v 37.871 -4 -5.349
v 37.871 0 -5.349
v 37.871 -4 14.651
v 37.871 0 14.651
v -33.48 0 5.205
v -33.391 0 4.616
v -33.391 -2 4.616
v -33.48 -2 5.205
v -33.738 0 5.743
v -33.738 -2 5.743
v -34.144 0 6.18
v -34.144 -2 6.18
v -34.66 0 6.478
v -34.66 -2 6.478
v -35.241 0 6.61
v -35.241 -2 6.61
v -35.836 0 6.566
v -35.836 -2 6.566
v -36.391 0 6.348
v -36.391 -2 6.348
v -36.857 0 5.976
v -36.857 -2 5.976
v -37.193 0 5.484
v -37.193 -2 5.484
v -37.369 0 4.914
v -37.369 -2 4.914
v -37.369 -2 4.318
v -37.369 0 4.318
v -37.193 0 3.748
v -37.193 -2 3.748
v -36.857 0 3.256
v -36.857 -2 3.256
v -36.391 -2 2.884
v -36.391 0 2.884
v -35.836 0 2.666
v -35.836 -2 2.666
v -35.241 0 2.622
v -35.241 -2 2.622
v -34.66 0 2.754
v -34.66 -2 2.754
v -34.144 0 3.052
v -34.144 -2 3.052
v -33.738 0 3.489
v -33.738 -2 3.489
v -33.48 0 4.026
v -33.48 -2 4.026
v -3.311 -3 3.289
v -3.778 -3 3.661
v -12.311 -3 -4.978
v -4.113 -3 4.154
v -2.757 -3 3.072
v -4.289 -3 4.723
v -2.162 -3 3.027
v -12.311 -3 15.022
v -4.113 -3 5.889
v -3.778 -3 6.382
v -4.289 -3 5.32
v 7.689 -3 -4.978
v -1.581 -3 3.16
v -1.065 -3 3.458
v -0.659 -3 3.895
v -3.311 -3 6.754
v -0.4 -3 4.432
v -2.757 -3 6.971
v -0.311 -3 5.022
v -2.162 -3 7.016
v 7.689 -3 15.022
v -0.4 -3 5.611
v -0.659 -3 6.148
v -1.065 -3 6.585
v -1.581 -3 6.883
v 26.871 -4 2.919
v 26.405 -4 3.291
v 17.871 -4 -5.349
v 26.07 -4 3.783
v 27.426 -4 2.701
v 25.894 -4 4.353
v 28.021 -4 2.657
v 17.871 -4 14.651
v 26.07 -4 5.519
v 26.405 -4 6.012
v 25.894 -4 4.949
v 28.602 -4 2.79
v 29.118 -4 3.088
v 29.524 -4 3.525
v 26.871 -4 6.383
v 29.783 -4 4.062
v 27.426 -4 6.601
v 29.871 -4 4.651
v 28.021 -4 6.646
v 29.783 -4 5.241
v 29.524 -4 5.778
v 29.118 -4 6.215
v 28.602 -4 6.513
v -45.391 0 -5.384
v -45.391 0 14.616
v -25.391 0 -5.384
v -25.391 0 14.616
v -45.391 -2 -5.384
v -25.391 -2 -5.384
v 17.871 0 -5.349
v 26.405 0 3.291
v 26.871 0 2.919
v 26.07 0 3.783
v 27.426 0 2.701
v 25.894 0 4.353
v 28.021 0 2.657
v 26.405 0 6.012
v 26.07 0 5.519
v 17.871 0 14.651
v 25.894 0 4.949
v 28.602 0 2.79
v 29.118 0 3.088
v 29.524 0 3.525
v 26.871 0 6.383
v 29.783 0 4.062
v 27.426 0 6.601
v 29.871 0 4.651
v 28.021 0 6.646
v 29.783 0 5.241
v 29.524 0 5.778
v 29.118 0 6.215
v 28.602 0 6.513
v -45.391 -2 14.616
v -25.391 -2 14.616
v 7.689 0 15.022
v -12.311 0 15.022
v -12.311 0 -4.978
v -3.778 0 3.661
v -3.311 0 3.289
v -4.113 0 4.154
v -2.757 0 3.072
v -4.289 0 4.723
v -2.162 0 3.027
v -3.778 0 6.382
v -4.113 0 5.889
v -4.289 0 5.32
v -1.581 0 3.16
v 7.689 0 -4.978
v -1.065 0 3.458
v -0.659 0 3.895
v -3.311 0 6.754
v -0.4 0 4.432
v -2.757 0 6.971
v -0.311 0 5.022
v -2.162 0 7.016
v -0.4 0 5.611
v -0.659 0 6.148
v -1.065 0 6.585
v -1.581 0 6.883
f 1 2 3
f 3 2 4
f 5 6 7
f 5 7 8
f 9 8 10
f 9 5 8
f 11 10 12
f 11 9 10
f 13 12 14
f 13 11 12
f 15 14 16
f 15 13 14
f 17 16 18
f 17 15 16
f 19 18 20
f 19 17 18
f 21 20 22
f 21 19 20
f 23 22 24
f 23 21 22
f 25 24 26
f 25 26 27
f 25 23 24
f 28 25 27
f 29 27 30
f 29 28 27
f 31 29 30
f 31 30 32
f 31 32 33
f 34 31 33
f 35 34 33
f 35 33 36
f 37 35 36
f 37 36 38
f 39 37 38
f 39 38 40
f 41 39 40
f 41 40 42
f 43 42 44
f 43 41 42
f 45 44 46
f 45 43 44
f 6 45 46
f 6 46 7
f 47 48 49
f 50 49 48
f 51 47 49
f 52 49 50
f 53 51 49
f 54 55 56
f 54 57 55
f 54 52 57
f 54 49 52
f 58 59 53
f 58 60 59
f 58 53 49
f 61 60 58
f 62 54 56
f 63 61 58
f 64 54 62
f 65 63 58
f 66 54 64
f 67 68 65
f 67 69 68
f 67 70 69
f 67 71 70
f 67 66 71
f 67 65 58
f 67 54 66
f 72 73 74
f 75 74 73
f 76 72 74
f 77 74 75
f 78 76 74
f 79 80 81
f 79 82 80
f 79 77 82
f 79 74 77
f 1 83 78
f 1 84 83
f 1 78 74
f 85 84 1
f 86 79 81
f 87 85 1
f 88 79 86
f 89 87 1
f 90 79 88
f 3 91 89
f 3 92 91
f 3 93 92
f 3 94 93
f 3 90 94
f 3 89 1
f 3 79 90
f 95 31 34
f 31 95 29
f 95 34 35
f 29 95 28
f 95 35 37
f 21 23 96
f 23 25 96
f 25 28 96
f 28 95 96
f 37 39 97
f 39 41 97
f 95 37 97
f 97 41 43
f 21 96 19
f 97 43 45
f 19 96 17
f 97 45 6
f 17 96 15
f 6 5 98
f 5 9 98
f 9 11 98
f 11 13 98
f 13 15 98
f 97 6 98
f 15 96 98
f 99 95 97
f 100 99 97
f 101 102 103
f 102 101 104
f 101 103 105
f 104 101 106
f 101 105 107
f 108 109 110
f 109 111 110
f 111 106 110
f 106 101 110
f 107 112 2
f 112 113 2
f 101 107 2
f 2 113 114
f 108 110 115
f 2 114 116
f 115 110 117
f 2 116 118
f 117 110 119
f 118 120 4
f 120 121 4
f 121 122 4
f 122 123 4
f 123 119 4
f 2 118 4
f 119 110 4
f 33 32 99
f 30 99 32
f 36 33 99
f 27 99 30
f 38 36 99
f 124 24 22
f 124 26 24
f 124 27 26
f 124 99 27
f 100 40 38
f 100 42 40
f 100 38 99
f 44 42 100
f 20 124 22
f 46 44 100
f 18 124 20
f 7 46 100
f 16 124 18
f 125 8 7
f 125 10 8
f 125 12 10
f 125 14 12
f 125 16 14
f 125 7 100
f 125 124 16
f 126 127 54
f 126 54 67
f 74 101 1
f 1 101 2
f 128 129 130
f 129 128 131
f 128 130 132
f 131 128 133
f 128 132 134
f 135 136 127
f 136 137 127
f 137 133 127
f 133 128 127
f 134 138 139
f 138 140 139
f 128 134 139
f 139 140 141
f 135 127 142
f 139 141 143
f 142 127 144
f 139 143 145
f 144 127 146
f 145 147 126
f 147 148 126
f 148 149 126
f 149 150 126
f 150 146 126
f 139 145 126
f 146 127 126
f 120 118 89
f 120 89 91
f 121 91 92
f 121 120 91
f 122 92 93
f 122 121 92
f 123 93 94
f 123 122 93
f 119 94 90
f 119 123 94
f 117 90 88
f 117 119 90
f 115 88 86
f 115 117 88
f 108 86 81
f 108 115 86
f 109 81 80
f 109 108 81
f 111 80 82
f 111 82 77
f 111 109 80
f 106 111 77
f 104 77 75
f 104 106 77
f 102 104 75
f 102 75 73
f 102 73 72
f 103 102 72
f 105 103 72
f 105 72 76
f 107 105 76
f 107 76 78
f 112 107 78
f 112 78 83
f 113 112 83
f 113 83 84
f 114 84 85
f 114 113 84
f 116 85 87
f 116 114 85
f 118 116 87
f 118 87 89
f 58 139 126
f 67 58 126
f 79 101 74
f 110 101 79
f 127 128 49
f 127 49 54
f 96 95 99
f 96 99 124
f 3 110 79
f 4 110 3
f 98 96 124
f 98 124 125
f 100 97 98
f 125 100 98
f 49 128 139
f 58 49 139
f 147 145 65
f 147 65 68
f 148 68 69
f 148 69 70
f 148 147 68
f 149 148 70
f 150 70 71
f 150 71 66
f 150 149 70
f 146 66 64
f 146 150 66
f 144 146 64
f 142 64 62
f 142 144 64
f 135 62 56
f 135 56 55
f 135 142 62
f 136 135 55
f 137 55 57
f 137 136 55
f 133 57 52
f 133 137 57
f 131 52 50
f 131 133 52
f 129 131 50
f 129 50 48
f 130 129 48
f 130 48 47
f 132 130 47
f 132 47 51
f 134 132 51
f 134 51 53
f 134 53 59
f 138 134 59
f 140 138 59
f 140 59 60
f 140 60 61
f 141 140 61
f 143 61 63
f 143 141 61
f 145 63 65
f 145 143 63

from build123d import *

# Parameters (mm, degrees)
F0_W     = 20
F0_H     = 20
F0_R     = 2
F1_DEPTH = 2
F2_DEPTH = 3
F3_DEPTH = 4


with BuildPart() as f1:
    # F0 (on Front) → F1 (new body)
    with BuildSketch(Plane.XZ):
        with Locations((-35.390915, 4.615962)):
            Rectangle(F0_W, F0_H)
        with Locations((-35.390915, 4.615962)):
            Circle(F0_R, mode=Mode.SUBTRACT)
    extrude(amount=F1_DEPTH)


with BuildPart() as f2:
    # F0 (on Front) → F2 (new body)
    with BuildSketch(Plane.XZ):
        with Locations((-2.311487, 5.021508)):
            Rectangle(F0_W, F0_H)
        with Locations((-2.311487, 5.021508)):
            Circle(F0_R, mode=Mode.SUBTRACT)
    extrude(amount=F2_DEPTH)


with BuildPart() as f3:
    # F0 (on Front) → F3 (new body)
    with BuildSketch(Plane.XZ):
        with Locations((27.87146, 4.651255)):
            Rectangle(F0_W, F0_H)
        with Locations((27.87146, 4.651255)):
            Circle(F0_R, mode=Mode.SUBTRACT)
    extrude(amount=F3_DEPTH)


solid = Compound([f1.part, f2.part, f3.part])
